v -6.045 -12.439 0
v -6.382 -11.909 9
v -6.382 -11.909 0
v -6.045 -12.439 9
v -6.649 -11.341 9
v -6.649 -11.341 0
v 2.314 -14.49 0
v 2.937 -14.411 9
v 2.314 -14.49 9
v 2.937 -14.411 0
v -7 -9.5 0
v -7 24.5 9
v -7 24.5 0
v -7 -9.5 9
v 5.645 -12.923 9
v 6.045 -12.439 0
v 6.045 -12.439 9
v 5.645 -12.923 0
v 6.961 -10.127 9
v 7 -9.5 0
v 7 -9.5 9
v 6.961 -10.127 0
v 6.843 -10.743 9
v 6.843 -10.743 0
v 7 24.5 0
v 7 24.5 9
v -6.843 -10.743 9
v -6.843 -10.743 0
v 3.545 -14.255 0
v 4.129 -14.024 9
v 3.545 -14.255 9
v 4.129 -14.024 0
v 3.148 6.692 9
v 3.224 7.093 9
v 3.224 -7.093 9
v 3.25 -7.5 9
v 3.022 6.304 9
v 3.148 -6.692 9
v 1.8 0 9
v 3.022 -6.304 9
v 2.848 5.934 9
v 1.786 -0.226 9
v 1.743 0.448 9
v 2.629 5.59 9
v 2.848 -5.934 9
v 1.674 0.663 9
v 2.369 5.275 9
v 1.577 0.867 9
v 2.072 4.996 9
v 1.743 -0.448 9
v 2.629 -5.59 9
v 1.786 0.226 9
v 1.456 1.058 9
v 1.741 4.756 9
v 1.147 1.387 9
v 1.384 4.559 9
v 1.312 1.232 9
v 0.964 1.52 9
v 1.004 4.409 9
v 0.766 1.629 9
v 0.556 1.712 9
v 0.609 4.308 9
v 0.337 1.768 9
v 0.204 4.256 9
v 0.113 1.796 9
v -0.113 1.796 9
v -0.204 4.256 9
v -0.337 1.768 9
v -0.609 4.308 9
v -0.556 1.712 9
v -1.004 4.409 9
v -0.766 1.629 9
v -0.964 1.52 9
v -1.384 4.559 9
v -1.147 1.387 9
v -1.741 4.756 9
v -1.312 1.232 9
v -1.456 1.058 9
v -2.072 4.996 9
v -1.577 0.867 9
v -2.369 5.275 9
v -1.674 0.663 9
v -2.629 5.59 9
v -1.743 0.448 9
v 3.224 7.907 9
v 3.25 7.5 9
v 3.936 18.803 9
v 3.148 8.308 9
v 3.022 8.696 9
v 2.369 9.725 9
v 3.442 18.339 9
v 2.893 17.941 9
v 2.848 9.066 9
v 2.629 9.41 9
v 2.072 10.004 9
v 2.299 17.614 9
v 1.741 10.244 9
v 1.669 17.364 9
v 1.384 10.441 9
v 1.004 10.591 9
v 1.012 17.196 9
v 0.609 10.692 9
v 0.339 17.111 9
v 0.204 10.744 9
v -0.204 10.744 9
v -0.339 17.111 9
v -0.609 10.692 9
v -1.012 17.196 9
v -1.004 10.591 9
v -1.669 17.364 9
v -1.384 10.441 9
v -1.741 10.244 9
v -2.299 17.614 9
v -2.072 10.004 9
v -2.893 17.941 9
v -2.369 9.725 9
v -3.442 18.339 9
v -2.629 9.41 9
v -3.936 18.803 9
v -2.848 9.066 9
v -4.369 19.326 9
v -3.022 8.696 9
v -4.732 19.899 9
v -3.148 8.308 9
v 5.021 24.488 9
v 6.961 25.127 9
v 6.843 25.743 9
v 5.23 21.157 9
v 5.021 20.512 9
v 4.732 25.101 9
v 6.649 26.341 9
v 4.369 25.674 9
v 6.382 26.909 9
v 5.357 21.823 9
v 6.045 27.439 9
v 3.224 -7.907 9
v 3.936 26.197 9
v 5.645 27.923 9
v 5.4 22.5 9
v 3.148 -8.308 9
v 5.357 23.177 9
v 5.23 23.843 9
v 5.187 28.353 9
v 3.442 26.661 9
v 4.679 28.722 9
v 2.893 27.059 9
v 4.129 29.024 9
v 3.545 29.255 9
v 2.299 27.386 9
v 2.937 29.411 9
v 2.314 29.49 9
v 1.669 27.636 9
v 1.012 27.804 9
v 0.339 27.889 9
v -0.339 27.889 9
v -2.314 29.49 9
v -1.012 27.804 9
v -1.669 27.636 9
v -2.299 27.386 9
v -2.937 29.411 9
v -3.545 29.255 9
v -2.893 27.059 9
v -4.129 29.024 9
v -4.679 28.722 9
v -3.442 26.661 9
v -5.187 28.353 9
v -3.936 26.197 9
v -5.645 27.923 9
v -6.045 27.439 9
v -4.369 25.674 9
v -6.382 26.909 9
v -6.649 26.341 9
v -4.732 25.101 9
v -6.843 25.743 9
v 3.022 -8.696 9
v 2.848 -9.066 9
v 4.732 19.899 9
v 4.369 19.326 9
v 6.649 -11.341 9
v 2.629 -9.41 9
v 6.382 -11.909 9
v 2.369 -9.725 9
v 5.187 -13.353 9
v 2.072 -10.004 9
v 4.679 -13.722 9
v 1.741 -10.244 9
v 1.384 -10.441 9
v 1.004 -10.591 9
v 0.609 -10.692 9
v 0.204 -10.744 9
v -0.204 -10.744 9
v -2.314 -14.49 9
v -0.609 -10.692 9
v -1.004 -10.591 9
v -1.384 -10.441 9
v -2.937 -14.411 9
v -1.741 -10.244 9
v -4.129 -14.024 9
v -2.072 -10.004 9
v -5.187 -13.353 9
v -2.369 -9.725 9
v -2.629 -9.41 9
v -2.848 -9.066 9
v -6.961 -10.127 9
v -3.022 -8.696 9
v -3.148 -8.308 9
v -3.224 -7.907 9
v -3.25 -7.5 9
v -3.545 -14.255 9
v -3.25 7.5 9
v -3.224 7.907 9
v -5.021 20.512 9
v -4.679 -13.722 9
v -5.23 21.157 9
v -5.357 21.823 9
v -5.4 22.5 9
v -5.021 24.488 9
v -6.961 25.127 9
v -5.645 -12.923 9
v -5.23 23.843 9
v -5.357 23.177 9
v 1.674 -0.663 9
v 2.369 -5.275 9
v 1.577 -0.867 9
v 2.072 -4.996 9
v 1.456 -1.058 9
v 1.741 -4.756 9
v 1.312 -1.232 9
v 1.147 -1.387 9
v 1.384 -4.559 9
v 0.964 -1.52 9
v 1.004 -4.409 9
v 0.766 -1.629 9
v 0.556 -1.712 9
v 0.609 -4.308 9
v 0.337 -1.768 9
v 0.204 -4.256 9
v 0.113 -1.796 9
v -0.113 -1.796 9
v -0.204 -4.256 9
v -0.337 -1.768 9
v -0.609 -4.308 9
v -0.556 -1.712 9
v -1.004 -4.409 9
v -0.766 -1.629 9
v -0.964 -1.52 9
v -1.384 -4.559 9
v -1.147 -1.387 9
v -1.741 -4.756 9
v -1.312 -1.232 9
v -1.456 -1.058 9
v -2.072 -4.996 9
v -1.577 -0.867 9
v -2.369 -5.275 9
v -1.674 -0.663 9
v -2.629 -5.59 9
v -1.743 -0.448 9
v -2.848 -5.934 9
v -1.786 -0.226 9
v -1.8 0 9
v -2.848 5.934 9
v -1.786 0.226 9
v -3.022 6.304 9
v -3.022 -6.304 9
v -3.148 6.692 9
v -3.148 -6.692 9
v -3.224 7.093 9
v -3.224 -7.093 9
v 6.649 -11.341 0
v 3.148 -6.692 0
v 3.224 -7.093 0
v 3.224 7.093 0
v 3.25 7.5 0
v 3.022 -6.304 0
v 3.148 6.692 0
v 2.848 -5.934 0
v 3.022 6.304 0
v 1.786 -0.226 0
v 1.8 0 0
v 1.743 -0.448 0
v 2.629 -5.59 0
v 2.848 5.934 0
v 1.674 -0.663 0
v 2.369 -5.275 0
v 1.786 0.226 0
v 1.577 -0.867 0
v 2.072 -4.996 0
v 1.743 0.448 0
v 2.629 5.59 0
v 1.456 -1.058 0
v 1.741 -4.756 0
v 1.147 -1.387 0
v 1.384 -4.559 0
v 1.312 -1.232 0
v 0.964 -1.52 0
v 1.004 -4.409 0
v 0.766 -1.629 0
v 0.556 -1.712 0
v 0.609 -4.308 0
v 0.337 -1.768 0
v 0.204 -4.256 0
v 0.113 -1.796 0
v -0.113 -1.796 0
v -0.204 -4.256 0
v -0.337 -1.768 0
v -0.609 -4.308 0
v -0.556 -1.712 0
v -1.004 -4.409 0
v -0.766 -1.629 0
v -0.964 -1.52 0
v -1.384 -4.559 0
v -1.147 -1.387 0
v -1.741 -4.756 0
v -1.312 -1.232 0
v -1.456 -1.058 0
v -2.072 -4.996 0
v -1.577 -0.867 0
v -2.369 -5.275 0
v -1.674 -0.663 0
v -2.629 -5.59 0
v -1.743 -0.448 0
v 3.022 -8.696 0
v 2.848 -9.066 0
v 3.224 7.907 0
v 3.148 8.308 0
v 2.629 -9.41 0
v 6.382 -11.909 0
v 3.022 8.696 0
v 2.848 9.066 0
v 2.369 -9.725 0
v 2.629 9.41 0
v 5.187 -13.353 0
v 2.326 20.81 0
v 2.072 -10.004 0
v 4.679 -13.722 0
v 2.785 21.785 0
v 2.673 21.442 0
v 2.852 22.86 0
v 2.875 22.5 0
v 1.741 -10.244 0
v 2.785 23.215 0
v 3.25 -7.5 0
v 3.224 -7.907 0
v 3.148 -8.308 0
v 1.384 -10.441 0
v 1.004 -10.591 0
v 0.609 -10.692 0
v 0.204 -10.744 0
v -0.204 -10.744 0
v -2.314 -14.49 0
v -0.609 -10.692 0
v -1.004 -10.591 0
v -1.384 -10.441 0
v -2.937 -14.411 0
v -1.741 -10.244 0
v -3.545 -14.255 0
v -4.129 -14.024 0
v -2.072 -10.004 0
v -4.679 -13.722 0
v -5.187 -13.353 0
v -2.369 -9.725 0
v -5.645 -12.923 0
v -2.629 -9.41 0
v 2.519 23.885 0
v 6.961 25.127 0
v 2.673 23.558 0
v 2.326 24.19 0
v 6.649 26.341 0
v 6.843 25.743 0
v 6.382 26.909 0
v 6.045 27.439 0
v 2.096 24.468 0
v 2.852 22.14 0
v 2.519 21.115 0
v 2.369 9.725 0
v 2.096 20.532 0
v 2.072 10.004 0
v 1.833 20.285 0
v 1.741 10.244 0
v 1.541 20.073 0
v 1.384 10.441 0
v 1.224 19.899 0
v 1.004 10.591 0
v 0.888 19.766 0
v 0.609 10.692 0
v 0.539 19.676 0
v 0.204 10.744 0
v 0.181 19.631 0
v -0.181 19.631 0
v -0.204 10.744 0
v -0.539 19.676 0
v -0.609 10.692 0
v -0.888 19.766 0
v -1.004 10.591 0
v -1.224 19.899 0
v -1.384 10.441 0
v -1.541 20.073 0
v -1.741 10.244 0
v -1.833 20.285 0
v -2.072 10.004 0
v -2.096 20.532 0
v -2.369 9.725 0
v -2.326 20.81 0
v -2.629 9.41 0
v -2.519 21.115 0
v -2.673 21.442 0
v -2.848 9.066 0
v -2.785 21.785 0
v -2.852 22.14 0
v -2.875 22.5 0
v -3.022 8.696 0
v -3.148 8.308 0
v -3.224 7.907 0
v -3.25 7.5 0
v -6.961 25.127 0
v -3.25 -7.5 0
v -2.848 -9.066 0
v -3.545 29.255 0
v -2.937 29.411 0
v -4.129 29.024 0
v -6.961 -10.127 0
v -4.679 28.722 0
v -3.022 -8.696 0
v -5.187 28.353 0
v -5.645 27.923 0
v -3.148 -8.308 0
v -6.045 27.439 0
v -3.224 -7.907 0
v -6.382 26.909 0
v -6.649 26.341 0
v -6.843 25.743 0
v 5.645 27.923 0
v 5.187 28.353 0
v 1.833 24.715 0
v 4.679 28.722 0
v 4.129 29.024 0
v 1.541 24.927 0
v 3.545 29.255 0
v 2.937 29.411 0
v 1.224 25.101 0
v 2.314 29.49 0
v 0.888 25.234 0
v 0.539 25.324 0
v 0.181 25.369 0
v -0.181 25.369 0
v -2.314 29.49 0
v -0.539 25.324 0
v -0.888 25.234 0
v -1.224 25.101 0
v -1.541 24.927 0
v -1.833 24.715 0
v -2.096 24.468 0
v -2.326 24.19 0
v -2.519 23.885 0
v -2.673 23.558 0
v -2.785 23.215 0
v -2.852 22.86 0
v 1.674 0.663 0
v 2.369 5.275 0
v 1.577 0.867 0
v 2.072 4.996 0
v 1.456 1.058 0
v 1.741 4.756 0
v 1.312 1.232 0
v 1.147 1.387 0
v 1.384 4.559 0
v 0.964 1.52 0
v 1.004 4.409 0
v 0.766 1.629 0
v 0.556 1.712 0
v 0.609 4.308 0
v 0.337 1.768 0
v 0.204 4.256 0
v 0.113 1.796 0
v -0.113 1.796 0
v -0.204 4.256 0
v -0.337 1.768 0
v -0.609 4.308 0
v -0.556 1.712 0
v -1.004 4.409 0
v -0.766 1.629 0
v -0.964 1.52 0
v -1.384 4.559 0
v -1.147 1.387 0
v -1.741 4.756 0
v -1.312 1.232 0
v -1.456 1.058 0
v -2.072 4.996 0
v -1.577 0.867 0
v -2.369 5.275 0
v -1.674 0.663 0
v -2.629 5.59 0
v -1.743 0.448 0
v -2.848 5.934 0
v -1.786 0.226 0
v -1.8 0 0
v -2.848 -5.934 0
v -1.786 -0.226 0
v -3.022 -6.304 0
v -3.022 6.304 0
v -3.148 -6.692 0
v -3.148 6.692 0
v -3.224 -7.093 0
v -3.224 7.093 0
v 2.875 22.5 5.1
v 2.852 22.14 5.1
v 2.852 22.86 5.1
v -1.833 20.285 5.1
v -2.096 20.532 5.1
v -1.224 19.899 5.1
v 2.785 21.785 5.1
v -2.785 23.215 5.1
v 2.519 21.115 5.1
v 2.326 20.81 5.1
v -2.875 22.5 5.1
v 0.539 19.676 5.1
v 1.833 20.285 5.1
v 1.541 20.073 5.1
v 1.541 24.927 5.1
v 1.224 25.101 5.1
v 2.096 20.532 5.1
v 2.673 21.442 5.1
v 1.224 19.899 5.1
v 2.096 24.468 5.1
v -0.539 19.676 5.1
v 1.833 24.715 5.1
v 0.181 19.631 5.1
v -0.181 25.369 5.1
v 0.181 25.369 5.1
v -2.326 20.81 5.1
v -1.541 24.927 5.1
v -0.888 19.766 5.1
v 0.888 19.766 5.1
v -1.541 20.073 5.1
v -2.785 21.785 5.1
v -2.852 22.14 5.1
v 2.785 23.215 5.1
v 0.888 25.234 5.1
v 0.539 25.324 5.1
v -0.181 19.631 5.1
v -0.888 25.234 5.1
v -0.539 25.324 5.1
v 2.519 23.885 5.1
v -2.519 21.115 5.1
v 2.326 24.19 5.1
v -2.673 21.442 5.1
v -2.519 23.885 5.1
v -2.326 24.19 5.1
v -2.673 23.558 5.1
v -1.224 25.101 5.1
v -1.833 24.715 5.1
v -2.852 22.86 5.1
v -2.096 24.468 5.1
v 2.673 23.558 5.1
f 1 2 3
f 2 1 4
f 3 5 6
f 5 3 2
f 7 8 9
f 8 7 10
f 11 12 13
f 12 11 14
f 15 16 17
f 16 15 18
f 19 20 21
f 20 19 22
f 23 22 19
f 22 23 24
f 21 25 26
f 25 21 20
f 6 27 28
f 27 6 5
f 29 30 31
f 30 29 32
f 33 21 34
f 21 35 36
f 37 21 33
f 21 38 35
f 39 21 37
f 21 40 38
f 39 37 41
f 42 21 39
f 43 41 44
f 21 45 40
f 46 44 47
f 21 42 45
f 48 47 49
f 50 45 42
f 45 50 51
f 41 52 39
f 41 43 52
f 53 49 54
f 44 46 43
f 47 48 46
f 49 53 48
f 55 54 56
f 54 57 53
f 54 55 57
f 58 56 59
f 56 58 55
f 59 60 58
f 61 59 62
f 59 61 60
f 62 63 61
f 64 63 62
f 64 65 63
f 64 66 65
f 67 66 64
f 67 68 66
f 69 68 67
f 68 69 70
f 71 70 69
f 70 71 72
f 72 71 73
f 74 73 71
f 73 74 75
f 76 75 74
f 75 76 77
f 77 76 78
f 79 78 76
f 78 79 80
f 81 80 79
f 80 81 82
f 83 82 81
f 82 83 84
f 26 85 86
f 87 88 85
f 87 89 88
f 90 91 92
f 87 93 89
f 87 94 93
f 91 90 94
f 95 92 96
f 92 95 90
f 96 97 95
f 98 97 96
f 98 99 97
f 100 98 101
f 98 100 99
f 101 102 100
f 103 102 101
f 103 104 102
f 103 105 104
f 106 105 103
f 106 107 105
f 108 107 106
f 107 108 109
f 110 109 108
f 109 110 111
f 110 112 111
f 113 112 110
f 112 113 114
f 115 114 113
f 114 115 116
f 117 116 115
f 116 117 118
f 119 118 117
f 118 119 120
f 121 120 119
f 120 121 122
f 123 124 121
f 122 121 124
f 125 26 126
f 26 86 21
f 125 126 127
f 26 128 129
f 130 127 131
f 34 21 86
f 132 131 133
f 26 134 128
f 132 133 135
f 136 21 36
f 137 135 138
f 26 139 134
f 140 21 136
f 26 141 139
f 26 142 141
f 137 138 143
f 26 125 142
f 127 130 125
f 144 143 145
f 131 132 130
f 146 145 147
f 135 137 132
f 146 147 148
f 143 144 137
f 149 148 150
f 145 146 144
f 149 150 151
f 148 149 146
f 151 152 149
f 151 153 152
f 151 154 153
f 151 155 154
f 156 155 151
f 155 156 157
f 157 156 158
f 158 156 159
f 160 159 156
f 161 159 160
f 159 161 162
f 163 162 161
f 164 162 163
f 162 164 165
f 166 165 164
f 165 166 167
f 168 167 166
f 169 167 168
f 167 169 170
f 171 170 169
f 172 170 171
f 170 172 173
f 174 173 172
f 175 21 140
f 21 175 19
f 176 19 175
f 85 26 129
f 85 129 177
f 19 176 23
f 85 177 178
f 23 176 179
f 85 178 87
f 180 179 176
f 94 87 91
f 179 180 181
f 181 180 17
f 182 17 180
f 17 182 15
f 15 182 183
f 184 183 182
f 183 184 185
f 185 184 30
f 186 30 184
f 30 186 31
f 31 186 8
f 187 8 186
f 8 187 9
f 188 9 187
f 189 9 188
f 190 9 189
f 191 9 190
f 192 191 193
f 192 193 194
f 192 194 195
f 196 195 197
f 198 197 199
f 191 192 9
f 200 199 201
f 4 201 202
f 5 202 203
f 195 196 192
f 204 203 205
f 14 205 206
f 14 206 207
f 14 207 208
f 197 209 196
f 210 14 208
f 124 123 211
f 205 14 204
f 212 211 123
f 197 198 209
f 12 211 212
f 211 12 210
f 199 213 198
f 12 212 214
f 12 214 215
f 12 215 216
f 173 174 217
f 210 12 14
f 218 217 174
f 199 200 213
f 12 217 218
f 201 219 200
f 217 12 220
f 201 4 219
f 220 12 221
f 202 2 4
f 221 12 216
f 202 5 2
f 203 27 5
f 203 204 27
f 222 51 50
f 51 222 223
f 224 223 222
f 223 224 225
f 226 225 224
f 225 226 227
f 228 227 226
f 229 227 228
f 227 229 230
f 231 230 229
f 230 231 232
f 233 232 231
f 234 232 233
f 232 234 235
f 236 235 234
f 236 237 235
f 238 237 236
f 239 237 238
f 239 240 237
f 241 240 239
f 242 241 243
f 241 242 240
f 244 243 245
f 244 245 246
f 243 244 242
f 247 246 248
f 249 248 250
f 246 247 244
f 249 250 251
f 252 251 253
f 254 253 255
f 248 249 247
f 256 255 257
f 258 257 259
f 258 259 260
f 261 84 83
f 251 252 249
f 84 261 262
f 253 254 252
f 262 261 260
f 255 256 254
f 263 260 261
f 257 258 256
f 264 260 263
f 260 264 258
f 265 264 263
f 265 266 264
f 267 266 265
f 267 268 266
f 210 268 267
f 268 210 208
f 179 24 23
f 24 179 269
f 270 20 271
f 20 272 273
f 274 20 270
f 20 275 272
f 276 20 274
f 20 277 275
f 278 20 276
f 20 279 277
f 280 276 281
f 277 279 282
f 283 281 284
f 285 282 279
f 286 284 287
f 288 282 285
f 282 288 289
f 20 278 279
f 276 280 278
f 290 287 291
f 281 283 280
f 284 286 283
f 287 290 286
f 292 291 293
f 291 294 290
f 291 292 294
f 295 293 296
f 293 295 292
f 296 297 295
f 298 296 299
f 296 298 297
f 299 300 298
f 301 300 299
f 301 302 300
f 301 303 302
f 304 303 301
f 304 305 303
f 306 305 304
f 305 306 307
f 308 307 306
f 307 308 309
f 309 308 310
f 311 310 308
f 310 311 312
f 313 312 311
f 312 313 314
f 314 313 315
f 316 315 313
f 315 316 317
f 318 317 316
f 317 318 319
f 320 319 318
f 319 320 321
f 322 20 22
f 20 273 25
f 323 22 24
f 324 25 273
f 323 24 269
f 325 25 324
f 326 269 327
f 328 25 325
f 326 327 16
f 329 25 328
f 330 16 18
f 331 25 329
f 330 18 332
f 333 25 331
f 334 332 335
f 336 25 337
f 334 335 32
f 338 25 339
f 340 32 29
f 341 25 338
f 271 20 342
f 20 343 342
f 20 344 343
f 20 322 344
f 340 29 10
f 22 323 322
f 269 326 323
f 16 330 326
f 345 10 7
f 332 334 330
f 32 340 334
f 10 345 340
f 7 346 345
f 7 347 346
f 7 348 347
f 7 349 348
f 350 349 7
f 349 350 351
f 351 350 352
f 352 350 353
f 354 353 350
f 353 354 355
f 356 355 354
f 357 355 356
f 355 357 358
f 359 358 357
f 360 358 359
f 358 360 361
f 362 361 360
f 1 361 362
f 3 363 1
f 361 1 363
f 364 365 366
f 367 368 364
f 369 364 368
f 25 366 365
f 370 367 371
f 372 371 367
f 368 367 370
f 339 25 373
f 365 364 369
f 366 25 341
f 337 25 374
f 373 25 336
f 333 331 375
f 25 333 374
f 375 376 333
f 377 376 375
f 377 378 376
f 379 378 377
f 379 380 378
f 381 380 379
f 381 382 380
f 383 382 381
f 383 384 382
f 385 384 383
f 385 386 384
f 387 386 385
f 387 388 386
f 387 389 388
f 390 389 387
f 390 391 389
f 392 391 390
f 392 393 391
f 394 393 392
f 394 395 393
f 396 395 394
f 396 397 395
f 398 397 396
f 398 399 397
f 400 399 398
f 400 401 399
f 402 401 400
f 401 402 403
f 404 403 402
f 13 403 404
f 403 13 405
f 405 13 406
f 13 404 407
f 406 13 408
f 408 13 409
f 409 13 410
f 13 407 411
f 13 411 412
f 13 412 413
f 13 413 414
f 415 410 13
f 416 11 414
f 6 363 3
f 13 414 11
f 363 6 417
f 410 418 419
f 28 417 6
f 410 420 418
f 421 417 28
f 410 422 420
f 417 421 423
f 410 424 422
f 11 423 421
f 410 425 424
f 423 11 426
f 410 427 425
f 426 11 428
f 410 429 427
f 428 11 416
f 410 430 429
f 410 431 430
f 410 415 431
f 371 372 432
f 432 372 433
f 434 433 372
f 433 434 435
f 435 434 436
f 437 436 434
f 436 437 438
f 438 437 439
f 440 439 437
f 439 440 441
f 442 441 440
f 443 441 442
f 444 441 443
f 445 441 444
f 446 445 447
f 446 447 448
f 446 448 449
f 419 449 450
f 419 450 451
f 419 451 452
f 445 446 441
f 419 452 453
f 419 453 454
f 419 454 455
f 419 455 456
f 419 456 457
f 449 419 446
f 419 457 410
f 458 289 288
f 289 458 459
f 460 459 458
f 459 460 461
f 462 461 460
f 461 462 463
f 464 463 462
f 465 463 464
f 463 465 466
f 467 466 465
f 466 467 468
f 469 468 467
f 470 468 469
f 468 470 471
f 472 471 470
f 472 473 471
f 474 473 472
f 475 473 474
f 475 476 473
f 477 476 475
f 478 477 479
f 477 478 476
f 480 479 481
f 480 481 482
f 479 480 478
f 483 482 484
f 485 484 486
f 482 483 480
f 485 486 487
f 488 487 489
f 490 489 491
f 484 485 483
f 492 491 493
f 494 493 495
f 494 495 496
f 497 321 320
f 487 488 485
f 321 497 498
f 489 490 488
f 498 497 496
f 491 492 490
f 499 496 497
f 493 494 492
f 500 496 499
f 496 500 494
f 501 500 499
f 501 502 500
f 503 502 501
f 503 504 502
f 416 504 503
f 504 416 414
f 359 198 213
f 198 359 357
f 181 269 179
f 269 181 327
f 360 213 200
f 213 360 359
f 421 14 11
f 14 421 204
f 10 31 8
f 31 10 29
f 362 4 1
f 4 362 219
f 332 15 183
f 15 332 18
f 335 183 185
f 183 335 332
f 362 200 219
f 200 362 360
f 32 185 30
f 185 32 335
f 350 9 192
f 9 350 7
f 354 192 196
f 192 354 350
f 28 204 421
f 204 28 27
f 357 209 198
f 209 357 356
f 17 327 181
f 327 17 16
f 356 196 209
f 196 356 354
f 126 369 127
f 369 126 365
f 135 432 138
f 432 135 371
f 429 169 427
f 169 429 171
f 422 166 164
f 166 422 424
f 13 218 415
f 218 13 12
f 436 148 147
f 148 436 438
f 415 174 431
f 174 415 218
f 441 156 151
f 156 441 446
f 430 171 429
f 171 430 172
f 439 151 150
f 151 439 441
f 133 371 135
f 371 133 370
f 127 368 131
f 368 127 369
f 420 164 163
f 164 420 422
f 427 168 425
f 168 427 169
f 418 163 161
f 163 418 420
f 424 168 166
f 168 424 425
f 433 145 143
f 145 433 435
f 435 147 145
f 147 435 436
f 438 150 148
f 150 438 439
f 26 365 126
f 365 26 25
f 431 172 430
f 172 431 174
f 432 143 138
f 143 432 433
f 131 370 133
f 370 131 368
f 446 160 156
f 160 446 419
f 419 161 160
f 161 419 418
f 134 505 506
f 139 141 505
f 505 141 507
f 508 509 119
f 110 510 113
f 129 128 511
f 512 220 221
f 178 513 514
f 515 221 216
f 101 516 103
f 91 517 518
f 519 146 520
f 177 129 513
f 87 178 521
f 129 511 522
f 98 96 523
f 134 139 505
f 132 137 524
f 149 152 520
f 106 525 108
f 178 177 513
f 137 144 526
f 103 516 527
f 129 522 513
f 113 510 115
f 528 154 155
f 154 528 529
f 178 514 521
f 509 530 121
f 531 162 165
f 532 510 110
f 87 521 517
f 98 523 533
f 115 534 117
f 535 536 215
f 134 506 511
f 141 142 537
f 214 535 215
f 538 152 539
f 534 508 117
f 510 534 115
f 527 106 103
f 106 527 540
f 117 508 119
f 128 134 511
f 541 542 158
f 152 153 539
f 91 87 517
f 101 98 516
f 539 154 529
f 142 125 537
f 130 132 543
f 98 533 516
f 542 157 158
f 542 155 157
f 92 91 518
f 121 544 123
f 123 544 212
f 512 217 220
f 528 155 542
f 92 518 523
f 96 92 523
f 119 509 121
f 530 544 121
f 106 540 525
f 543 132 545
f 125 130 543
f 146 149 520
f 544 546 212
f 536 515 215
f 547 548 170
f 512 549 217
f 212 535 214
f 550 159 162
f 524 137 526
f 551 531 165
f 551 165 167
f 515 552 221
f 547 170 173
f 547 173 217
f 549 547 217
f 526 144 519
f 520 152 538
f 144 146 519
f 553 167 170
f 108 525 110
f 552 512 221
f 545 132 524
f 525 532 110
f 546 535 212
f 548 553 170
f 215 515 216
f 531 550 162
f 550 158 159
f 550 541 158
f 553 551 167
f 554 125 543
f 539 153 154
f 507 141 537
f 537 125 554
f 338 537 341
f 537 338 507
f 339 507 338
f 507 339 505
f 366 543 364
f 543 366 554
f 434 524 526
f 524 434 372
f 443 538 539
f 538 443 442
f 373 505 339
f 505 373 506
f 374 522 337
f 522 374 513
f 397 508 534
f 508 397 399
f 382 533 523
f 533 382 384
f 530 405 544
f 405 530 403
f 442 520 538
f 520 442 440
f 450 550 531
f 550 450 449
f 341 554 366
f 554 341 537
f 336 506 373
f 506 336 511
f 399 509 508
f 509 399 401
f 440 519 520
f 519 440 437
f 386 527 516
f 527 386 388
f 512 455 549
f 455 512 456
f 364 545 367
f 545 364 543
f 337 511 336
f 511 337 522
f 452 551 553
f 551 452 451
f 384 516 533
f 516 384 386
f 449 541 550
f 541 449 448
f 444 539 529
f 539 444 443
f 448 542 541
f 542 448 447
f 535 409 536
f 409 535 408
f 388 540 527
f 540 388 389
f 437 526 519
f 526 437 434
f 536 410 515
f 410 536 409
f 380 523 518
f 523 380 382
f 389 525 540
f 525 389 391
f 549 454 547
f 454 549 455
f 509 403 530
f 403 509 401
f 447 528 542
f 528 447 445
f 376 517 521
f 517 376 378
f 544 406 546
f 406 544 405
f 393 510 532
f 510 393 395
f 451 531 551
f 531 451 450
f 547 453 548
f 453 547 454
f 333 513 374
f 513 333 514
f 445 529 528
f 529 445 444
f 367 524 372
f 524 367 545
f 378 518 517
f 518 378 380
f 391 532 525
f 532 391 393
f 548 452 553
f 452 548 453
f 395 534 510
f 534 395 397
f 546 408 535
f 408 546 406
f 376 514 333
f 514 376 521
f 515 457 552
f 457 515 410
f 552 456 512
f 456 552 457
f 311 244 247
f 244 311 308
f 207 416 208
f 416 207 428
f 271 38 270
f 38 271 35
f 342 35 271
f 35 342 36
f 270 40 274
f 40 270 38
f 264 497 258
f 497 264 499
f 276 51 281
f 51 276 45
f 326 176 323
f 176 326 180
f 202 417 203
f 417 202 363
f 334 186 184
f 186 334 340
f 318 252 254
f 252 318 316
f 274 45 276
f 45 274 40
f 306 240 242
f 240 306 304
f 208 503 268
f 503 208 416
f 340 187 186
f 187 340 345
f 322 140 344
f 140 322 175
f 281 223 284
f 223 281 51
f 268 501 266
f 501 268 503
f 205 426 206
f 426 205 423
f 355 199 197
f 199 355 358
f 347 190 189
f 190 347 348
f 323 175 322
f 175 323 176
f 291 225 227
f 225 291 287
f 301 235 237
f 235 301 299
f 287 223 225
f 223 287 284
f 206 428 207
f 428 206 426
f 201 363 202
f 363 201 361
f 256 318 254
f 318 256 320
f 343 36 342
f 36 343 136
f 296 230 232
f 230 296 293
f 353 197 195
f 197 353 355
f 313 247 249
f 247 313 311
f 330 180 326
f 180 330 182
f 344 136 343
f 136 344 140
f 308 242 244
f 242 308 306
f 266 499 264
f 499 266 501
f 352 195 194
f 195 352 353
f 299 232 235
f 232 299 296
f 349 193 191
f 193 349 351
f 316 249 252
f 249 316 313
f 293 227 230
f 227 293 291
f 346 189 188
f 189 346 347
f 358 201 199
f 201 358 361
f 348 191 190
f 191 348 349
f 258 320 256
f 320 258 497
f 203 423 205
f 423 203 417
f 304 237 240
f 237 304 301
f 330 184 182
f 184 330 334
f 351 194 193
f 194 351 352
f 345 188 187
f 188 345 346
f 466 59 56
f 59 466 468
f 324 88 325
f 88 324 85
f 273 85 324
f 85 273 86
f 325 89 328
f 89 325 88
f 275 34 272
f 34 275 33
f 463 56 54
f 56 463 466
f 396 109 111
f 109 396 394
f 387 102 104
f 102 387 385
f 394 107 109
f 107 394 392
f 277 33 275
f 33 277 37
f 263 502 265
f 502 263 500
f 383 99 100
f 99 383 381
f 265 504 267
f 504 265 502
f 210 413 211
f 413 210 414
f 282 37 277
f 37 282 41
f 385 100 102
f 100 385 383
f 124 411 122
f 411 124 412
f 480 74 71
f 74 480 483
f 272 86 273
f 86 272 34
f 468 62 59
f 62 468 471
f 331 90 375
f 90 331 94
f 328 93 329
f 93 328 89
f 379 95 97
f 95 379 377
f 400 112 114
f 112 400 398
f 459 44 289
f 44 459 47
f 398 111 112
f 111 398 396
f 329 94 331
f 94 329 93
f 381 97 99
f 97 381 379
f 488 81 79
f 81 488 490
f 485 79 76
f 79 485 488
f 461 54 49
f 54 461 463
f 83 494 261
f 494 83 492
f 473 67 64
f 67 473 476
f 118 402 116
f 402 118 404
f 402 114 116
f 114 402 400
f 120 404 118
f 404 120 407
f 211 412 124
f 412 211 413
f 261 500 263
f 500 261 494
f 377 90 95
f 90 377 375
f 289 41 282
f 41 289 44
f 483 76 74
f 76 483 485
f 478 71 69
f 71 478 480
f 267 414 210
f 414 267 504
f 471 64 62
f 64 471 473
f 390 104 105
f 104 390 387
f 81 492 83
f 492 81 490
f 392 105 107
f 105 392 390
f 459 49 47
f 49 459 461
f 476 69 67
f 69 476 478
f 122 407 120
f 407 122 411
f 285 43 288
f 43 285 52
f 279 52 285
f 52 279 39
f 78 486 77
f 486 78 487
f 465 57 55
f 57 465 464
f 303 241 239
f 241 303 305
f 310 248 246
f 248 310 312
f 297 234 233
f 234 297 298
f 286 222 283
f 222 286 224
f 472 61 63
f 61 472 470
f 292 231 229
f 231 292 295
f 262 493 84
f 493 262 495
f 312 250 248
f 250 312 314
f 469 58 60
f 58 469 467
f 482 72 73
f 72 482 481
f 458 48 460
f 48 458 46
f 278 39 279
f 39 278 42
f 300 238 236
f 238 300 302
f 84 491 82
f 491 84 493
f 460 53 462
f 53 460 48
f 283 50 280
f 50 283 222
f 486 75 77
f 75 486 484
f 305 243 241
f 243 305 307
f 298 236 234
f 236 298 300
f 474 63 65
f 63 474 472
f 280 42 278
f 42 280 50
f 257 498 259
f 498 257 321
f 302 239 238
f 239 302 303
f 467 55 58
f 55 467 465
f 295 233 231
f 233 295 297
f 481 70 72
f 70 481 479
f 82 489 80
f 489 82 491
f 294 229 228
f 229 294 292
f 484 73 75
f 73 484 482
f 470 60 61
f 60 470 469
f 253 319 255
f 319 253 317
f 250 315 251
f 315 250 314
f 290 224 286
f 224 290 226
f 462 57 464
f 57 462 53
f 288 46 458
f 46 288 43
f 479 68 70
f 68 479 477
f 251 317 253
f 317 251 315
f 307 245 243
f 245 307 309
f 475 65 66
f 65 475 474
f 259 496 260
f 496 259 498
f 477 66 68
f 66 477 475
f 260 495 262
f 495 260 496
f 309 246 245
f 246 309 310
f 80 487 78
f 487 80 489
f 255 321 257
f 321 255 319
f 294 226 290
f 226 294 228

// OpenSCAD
$fn = 50;


difference() {
	union() {
		hull() {
			translate(v = [-2.0000000000, 9.5000000000, 0]) {
				cylinder(h = 9, r = 5);
			}
			translate(v = [2.0000000000, 9.5000000000, 0]) {
				cylinder(h = 9, r = 5);
			}
			translate(v = [-2.0000000000, -9.5000000000, 0]) {
				cylinder(h = 9, r = 5);
			}
			translate(v = [2.0000000000, -9.5000000000, 0]) {
				cylinder(h = 9, r = 5);
			}
		}
		translate(v = [0.0000000000, 15.0000000000, 0]) {
			hull() {
				translate(v = [-2.0000000000, 9.5000000000, 0]) {
					cylinder(h = 9, r = 5);
				}
				translate(v = [2.0000000000, 9.5000000000, 0]) {
					cylinder(h = 9, r = 5);
				}
				translate(v = [-2.0000000000, -9.5000000000, 0]) {
					cylinder(h = 9, r = 5);
				}
				translate(v = [2.0000000000, -9.5000000000, 0]) {
					cylinder(h = 9, r = 5);
				}
			}
		}
		translate(v = [0.0000000000, 15.0000000000, 0]) {
			hull() {
				translate(v = [-2.0000000000, 9.5000000000, 0]) {
					cylinder(h = 9, r = 5);
				}
				translate(v = [2.0000000000, 9.5000000000, 0]) {
					cylinder(h = 9, r = 5);
				}
				translate(v = [-2.0000000000, -9.5000000000, 0]) {
					cylinder(h = 9, r = 5);
				}
				translate(v = [2.0000000000, -9.5000000000, 0]) {
					cylinder(h = 9, r = 5);
				}
			}
		}
	}
	union() {
		translate(v = [0.0000000000, 22.5000000000, 9]) {
			rotate(a = [0, 0, 0]) {
				difference() {
					union() {
						#translate(v = [0, 0, -9.0000000000]) {
							cylinder(h = 9, r = 2.6000000000);
						}
						#translate(v = [0, 0, -3.9000000000]) {
							cylinder(h = 3.9000000000, r1 = 2.8750000000, r2 = 5.4000000000);
						}
						#translate(v = [0, 0, -9.0000000000]) {
							cylinder(h = 9, r = 2.8750000000);
						}
						#translate(v = [0, 0, -9.0000000000]) {
							cylinder(h = 9, r = 2.6000000000);
						}
					}
					union();
				}
			}
		}
		translate(v = [0.0000000000, 22.5000000000, 9]) {
			rotate(a = [0, 0, 0]) {
				difference() {
					union() {
						#translate(v = [0, 0, -9.0000000000]) {
							cylinder(h = 9, r = 2.6000000000);
						}
						#translate(v = [0, 0, -3.9000000000]) {
							cylinder(h = 3.9000000000, r1 = 2.8750000000, r2 = 5.4000000000);
						}
						#translate(v = [0, 0, -9.0000000000]) {
							cylinder(h = 9, r = 2.8750000000);
						}
						#translate(v = [0, 0, -9.0000000000]) {
							cylinder(h = 9, r = 2.6000000000);
						}
					}
					union();
				}
			}
		}
		translate(v = [0.0000000000, -7.5000000000, 0]) {
			translate(v = [0, 0, -100]) {
				cylinder(h = 200, r = 3.2500000000);
			}
		}
		translate(v = [0.0000000000, 7.5000000000, 0]) {
			translate(v = [0, 0, -100]) {
				cylinder(h = 200, r = 3.2500000000);
			}
		}
		translate(v = [0.0000000000, -7.5000000000, 0]) {
			translate(v = [0, 0, -100]) {
				cylinder(h = 200, r = 1.8000000000);
			}
		}
		translate(v = [0, 0, -100]) {
			cylinder(h = 200, r = 1.8000000000);
		}
		translate(v = [0.0000000000, 7.5000000000, 0]) {
			translate(v = [0, 0, -100]) {
				cylinder(h = 200, r = 1.8000000000);
			}
		}
	}
}
